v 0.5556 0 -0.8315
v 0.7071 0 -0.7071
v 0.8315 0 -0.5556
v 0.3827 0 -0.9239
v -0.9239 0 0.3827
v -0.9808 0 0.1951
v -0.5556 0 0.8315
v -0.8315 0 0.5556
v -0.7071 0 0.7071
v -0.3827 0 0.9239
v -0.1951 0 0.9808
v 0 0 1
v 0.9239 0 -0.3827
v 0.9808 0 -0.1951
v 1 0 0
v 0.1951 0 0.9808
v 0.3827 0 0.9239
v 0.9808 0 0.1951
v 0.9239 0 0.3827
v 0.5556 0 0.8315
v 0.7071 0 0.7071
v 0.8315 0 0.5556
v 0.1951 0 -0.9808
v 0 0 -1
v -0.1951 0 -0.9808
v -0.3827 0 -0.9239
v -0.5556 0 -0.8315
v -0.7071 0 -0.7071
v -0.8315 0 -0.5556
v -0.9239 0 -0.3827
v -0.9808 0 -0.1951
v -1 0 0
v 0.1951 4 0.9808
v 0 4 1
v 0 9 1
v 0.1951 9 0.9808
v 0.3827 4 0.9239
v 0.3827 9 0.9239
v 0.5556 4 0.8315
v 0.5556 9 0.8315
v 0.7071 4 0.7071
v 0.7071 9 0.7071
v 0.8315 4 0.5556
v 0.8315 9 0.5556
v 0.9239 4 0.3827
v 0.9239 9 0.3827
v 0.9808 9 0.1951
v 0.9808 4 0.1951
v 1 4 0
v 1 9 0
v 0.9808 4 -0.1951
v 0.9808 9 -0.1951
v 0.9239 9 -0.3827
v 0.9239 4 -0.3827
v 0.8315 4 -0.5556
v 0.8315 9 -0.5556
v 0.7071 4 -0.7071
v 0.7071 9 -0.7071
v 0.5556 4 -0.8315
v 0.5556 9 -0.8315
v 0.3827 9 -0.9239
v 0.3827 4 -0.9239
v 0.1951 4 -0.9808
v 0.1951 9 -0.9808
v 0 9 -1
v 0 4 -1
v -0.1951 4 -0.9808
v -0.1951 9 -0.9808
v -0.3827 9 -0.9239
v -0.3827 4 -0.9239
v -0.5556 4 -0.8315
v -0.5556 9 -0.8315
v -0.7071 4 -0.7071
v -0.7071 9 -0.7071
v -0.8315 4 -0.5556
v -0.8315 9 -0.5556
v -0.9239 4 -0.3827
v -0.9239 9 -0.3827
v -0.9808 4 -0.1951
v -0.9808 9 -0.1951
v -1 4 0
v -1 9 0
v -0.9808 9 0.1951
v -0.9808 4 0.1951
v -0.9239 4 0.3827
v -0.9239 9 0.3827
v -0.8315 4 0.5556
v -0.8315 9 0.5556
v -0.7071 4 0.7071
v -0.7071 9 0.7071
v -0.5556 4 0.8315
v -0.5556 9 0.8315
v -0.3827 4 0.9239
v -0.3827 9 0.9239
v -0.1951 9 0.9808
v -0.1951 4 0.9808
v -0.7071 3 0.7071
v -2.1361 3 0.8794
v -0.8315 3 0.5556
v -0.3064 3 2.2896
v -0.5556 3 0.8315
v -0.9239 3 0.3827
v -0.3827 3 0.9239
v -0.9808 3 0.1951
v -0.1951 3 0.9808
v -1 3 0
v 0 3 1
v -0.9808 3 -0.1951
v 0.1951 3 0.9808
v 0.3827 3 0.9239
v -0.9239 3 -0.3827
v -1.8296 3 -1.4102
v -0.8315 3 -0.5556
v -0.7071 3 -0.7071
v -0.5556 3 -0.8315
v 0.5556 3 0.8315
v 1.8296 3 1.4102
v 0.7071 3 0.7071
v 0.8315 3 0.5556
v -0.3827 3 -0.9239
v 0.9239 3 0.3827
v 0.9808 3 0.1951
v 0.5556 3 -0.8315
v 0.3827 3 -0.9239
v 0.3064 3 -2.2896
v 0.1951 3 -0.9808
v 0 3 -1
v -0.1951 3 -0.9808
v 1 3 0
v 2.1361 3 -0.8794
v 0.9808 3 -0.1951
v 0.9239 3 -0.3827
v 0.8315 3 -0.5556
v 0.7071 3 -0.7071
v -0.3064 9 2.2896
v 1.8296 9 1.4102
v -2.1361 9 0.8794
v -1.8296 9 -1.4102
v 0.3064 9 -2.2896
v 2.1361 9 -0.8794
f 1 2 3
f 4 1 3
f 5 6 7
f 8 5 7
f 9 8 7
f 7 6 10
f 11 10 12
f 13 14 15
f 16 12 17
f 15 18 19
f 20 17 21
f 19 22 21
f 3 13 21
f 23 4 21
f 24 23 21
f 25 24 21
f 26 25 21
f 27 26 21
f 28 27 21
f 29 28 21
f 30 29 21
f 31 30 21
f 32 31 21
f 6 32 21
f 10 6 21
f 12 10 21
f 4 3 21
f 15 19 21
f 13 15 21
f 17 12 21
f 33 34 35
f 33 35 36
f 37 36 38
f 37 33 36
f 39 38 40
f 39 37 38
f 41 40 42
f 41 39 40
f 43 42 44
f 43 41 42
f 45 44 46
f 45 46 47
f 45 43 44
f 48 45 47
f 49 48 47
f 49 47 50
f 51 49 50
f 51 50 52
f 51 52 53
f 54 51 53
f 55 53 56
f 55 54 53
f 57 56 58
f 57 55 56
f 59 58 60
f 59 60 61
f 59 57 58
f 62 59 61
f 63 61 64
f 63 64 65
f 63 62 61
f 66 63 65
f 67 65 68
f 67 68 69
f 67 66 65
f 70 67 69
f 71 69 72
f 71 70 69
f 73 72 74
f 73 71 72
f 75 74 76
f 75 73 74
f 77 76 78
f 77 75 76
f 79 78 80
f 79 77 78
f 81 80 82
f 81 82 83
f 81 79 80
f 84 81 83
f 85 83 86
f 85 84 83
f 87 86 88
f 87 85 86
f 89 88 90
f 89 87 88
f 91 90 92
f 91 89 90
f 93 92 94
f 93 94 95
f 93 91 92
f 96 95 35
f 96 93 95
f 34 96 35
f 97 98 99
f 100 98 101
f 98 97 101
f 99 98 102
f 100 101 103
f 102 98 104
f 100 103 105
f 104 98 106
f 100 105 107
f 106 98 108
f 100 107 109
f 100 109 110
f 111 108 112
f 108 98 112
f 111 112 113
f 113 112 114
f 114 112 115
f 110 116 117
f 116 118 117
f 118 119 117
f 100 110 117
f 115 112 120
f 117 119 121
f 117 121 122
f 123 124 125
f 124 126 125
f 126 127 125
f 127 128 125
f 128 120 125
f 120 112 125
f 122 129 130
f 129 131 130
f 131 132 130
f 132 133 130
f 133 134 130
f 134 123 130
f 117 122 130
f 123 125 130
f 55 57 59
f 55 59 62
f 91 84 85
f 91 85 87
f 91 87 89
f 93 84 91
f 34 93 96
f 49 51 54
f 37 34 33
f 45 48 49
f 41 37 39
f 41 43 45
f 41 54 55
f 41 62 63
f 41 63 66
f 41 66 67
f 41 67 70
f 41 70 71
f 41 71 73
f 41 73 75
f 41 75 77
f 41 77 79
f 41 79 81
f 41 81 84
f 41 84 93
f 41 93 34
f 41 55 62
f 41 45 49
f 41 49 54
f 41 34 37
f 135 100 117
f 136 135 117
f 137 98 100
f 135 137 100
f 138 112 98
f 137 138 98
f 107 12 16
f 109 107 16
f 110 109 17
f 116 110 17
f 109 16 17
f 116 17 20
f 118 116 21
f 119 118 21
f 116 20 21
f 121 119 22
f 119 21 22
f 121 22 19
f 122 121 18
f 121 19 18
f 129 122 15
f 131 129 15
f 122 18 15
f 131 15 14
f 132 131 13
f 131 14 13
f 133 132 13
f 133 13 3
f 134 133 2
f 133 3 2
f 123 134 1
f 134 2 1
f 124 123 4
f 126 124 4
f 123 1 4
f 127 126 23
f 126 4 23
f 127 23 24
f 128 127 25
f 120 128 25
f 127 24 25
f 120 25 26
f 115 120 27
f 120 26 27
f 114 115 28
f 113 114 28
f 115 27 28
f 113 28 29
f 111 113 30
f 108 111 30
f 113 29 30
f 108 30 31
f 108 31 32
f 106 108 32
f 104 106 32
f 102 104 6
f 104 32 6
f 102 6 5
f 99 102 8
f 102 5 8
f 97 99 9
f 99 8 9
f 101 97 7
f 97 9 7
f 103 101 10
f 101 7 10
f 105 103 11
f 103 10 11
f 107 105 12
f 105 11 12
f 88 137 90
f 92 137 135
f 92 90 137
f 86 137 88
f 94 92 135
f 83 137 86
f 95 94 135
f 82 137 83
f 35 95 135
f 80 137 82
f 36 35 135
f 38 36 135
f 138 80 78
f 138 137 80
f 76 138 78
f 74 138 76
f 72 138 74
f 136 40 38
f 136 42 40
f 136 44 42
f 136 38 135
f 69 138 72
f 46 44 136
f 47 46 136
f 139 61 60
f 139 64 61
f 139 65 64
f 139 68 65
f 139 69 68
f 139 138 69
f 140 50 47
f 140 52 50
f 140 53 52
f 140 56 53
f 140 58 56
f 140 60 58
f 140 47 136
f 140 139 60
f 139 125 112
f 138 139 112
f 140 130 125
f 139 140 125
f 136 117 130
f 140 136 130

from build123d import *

# Parameters (mm, degrees)
SKETCH1_R           = 1
BOSS_EXTRUDE1_DEPTH = 3
BOSS_EXTRUDE2_DEPTH = 6
CUT_EXTRUDE1_START  = -5
SKETCH3_R           = 1
CUT_EXTRUDE1_DEPTH  = 5


with BuildPart() as part:
    # Sketch1 → Boss-Extrude1 (new body)
    with BuildSketch(Plane(origin=(0, 0, 0), x_dir=(1, 0, 0), z_dir=(0, 1, 0))):
        with Locations(Location((0, 0, 0), (0, 0, 270))):
            Circle(SKETCH1_R)
    extrude(amount=BOSS_EXTRUDE1_DEPTH)

    # Sketch2 → Boss-Extrude2 (add)
    with BuildSketch(Plane(origin=(0, 3, 0), x_dir=(1, 0, 0), z_dir=(0, 1, 0))):
        Polygon((-0.306435831, -2.289584478), (1.829620407, -1.410173453), (2.136056237, 0.879411025), (0.306435831, 2.289584478), (-1.829620407, 1.410173453), (-2.136056237, -0.879411025), align=None)
    extrude(amount=BOSS_EXTRUDE2_DEPTH)

    # Sketch3 → Cut-Extrude1 (cut)
    with BuildSketch(Plane(origin=(0, 9, 0), x_dir=(1, 0, 0), z_dir=(0, 1, 0)).offset(CUT_EXTRUDE1_START)):
        with Locations(Location((0, 0, 0), (0, 0, 270))):
            Circle(SKETCH3_R)
    extrude(amount=CUT_EXTRUDE1_DEPTH, mode=Mode.SUBTRACT)


solid = part.part
